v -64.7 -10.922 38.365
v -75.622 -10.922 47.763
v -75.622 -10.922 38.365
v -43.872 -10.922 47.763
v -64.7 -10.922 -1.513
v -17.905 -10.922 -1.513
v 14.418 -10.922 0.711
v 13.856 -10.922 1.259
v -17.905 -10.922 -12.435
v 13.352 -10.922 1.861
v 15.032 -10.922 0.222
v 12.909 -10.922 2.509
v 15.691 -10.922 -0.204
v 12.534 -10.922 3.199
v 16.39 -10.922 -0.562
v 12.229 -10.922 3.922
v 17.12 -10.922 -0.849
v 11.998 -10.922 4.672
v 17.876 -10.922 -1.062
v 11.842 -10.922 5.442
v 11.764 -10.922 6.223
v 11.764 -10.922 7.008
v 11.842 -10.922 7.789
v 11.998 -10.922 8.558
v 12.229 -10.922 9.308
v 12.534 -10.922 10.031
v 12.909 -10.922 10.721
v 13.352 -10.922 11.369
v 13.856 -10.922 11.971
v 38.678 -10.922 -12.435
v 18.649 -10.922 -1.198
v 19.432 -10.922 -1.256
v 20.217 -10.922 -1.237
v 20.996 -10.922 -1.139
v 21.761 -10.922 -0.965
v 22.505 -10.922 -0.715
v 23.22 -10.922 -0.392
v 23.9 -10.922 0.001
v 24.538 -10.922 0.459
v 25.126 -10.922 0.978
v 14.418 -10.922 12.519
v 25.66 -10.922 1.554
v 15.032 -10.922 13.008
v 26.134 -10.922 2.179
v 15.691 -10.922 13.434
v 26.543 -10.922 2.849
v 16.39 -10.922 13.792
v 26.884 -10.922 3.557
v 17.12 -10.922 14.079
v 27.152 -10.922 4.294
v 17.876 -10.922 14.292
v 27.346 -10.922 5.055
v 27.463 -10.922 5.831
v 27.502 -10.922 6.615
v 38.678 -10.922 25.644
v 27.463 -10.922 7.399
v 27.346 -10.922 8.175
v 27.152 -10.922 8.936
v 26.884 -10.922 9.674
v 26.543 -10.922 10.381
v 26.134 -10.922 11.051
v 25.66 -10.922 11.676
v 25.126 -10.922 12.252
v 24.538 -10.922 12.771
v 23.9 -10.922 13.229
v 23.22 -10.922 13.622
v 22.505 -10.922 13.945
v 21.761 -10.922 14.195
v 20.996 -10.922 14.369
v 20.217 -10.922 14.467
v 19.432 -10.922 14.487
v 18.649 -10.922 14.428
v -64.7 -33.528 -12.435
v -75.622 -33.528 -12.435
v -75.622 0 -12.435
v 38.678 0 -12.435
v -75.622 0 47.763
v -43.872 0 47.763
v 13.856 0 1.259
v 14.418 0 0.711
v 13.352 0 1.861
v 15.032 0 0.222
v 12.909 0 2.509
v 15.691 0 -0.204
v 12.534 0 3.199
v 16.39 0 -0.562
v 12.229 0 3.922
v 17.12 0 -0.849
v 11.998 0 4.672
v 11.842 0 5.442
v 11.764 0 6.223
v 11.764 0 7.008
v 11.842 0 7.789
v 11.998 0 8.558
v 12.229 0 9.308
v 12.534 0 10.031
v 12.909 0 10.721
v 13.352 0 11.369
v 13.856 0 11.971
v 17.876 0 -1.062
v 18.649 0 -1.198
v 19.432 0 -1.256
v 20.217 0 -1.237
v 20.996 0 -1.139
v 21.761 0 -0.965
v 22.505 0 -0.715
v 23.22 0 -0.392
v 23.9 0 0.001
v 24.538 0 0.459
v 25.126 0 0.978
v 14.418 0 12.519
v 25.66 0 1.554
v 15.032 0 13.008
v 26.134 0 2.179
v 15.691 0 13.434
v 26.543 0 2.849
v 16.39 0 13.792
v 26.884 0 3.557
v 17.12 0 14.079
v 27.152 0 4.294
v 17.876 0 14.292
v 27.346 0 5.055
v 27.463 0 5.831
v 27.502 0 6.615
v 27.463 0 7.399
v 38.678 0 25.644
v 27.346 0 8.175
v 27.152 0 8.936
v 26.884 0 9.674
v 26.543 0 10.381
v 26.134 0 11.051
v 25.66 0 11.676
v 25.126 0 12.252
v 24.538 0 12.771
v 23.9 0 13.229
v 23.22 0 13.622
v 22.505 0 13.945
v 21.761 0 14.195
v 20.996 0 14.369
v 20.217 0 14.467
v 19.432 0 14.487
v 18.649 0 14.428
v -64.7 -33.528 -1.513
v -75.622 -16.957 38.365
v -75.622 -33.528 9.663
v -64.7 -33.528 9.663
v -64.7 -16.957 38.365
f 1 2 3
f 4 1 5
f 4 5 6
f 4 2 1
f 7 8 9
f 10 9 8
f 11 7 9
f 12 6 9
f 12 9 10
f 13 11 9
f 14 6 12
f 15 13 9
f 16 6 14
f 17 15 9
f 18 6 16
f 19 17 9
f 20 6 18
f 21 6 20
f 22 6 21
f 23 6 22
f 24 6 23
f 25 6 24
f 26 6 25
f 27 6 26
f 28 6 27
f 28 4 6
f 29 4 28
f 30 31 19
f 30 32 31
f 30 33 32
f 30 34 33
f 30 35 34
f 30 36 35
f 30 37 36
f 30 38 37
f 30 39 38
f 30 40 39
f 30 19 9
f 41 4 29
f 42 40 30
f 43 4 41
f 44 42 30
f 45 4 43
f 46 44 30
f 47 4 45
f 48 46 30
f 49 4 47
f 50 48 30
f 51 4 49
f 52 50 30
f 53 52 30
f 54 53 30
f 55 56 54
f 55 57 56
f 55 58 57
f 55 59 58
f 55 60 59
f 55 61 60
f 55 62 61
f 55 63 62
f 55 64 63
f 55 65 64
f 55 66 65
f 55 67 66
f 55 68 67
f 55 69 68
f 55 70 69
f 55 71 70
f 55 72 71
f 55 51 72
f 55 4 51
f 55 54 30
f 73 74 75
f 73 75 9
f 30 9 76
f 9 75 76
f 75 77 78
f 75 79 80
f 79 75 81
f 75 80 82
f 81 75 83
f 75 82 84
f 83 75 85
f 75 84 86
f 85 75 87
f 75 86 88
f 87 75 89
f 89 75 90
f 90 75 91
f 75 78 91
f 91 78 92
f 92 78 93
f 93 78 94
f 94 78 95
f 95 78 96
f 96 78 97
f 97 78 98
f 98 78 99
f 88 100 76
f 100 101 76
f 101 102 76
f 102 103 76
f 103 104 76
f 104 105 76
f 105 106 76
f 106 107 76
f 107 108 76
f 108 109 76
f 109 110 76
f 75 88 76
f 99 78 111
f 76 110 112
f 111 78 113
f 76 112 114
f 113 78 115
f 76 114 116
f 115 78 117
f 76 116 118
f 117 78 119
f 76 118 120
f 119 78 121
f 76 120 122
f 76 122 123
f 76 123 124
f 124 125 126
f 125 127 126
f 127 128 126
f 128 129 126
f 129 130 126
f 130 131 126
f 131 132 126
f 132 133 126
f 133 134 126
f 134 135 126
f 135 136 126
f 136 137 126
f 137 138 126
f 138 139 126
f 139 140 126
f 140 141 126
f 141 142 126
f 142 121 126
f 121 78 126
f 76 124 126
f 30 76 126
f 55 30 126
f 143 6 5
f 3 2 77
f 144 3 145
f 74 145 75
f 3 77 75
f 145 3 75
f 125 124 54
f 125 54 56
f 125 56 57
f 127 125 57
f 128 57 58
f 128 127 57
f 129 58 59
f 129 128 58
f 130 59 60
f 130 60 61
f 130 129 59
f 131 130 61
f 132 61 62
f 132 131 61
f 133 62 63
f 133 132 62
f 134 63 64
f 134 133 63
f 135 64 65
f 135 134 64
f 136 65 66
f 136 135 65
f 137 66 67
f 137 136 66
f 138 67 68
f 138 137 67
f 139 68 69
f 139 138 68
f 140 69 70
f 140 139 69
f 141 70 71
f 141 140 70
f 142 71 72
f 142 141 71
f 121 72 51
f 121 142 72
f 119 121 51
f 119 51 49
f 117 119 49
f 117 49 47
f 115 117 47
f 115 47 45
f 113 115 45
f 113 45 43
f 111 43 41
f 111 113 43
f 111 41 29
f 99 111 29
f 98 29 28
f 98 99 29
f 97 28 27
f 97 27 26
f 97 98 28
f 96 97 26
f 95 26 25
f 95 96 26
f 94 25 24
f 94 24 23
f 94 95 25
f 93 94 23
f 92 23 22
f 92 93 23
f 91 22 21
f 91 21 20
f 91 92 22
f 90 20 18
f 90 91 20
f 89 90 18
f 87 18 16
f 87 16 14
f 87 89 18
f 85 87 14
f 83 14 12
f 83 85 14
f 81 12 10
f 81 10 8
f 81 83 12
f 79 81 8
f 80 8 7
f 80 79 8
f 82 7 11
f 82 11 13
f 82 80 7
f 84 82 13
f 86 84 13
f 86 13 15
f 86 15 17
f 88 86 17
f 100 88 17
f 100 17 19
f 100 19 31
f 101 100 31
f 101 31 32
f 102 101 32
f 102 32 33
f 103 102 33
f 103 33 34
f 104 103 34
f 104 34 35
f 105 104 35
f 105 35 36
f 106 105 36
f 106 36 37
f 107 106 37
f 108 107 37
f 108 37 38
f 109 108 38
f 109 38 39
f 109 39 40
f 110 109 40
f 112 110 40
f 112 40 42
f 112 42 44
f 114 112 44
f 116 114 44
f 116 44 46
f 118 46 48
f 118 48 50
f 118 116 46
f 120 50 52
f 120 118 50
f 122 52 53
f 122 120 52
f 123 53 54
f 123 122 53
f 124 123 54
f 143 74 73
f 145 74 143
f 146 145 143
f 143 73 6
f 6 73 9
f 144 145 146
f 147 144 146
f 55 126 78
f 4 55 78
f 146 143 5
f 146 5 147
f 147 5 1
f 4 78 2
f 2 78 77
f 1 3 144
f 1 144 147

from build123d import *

# Parameters (mm, degrees)
F0_R        = 7.874
F1_DEPTH    = 10.922
F2_DEPTH    = 33.528
F0_W        = 10.922
F0_H        = 19.3979742137
F3_DEPTH    = 33.528
F4_SIZE2    = 16.5711074263
F4_SIZE     = 28.702
F5_T4_DEPTH = 283.3190140635


# Not quite as in the source:
# - a fillet or chamfer that OpenCascade refuses, or shapes differently, is made with other operations: its cross-section is extruded or revolved along the edge and cut away or added


with BuildPart() as f1:
    # F0 (on Front) → F1 (new body)
    with BuildSketch(Plane.XZ):
        Polygon((-43.8717590123, 47.7630699762), (-75.6217590123, 47.7630699762), (-75.6217590123, 38.3650699762), (-64.6997590123, 38.3650699762), (-64.6997590123, 18.9670957625), (-64.6997590123, -1.5129300238), (-12.1217590123, -1.5129300238), (-12.1217590123, -12.4349300238), (38.6782409877, -12.4349300238), (38.6782409877, 25.643864141), align=None)
        with Locations((19.6282409877, 6.6150699762)):
            Circle(F0_R, mode=Mode.SUBTRACT)
    extrude(amount=F1_DEPTH)

    # F0 (on Front) → F2 (join)
    with BuildSketch(Plane.XZ):
        Polygon((-43.8717590123, -12.4349300238), (-12.1217590123, -12.4349300238), (-12.1217590123, -1.5129300238), (-64.6997590123, -1.5129300238), (-64.6997590123, -12.4349300238), align=None)
    extrude(amount=F2_DEPTH)

    # F0 (on Front) → F3 (join)
    with BuildSketch(Plane.XZ):
        with Locations((-70.1607590123, 28.6660828693)):
            Rectangle(F0_W, F0_H)
        Polygon((-64.6997590123, 18.9670957625), (-75.6217590123, 18.9670957625), (-75.6217590123, -12.4349300238), (-64.6997590123, -12.4349300238), (-64.6997590123, -1.5129300238), align=None)
    extrude(amount=F3_DEPTH)

    # F4
    f4_edges = [f1.edges().sort_by_distance(p)[0] for p in [
        (-70.160759, -33.528, 38.36507),
    ]]
    f4_side = f1.faces().sort_by_distance((-70.160759, -33.528, 37.551873))[0]
    chamfer(f4_edges, length=F4_SIZE, length2=F4_SIZE2, reference=f4_side)

    # F5: chamfer of 25.4 x 52.578 on 1 edges, made by hand


with BuildPart() as f5_tool2:
    # F5_s3 → F5_t4 (new body)
    with BuildSketch(Plane.XY.offset(-148.6334370556)):
        Polygon((-64.6997590123, -33.528), (-12.1217590123, -8.128), (-12.1217590123, -33.528), align=None)
    extrude(amount=F5_T4_DEPTH)

    split(bisect_by=Plane.XZ.offset(10.922), keep=Keep.TOP)


with BuildPart() as f1_1:
    add(f1.part)

    # F5_t1: cut F5_tool2
    add(f5_tool2.part, mode=Mode.SUBTRACT)


solid = f1_1.part
